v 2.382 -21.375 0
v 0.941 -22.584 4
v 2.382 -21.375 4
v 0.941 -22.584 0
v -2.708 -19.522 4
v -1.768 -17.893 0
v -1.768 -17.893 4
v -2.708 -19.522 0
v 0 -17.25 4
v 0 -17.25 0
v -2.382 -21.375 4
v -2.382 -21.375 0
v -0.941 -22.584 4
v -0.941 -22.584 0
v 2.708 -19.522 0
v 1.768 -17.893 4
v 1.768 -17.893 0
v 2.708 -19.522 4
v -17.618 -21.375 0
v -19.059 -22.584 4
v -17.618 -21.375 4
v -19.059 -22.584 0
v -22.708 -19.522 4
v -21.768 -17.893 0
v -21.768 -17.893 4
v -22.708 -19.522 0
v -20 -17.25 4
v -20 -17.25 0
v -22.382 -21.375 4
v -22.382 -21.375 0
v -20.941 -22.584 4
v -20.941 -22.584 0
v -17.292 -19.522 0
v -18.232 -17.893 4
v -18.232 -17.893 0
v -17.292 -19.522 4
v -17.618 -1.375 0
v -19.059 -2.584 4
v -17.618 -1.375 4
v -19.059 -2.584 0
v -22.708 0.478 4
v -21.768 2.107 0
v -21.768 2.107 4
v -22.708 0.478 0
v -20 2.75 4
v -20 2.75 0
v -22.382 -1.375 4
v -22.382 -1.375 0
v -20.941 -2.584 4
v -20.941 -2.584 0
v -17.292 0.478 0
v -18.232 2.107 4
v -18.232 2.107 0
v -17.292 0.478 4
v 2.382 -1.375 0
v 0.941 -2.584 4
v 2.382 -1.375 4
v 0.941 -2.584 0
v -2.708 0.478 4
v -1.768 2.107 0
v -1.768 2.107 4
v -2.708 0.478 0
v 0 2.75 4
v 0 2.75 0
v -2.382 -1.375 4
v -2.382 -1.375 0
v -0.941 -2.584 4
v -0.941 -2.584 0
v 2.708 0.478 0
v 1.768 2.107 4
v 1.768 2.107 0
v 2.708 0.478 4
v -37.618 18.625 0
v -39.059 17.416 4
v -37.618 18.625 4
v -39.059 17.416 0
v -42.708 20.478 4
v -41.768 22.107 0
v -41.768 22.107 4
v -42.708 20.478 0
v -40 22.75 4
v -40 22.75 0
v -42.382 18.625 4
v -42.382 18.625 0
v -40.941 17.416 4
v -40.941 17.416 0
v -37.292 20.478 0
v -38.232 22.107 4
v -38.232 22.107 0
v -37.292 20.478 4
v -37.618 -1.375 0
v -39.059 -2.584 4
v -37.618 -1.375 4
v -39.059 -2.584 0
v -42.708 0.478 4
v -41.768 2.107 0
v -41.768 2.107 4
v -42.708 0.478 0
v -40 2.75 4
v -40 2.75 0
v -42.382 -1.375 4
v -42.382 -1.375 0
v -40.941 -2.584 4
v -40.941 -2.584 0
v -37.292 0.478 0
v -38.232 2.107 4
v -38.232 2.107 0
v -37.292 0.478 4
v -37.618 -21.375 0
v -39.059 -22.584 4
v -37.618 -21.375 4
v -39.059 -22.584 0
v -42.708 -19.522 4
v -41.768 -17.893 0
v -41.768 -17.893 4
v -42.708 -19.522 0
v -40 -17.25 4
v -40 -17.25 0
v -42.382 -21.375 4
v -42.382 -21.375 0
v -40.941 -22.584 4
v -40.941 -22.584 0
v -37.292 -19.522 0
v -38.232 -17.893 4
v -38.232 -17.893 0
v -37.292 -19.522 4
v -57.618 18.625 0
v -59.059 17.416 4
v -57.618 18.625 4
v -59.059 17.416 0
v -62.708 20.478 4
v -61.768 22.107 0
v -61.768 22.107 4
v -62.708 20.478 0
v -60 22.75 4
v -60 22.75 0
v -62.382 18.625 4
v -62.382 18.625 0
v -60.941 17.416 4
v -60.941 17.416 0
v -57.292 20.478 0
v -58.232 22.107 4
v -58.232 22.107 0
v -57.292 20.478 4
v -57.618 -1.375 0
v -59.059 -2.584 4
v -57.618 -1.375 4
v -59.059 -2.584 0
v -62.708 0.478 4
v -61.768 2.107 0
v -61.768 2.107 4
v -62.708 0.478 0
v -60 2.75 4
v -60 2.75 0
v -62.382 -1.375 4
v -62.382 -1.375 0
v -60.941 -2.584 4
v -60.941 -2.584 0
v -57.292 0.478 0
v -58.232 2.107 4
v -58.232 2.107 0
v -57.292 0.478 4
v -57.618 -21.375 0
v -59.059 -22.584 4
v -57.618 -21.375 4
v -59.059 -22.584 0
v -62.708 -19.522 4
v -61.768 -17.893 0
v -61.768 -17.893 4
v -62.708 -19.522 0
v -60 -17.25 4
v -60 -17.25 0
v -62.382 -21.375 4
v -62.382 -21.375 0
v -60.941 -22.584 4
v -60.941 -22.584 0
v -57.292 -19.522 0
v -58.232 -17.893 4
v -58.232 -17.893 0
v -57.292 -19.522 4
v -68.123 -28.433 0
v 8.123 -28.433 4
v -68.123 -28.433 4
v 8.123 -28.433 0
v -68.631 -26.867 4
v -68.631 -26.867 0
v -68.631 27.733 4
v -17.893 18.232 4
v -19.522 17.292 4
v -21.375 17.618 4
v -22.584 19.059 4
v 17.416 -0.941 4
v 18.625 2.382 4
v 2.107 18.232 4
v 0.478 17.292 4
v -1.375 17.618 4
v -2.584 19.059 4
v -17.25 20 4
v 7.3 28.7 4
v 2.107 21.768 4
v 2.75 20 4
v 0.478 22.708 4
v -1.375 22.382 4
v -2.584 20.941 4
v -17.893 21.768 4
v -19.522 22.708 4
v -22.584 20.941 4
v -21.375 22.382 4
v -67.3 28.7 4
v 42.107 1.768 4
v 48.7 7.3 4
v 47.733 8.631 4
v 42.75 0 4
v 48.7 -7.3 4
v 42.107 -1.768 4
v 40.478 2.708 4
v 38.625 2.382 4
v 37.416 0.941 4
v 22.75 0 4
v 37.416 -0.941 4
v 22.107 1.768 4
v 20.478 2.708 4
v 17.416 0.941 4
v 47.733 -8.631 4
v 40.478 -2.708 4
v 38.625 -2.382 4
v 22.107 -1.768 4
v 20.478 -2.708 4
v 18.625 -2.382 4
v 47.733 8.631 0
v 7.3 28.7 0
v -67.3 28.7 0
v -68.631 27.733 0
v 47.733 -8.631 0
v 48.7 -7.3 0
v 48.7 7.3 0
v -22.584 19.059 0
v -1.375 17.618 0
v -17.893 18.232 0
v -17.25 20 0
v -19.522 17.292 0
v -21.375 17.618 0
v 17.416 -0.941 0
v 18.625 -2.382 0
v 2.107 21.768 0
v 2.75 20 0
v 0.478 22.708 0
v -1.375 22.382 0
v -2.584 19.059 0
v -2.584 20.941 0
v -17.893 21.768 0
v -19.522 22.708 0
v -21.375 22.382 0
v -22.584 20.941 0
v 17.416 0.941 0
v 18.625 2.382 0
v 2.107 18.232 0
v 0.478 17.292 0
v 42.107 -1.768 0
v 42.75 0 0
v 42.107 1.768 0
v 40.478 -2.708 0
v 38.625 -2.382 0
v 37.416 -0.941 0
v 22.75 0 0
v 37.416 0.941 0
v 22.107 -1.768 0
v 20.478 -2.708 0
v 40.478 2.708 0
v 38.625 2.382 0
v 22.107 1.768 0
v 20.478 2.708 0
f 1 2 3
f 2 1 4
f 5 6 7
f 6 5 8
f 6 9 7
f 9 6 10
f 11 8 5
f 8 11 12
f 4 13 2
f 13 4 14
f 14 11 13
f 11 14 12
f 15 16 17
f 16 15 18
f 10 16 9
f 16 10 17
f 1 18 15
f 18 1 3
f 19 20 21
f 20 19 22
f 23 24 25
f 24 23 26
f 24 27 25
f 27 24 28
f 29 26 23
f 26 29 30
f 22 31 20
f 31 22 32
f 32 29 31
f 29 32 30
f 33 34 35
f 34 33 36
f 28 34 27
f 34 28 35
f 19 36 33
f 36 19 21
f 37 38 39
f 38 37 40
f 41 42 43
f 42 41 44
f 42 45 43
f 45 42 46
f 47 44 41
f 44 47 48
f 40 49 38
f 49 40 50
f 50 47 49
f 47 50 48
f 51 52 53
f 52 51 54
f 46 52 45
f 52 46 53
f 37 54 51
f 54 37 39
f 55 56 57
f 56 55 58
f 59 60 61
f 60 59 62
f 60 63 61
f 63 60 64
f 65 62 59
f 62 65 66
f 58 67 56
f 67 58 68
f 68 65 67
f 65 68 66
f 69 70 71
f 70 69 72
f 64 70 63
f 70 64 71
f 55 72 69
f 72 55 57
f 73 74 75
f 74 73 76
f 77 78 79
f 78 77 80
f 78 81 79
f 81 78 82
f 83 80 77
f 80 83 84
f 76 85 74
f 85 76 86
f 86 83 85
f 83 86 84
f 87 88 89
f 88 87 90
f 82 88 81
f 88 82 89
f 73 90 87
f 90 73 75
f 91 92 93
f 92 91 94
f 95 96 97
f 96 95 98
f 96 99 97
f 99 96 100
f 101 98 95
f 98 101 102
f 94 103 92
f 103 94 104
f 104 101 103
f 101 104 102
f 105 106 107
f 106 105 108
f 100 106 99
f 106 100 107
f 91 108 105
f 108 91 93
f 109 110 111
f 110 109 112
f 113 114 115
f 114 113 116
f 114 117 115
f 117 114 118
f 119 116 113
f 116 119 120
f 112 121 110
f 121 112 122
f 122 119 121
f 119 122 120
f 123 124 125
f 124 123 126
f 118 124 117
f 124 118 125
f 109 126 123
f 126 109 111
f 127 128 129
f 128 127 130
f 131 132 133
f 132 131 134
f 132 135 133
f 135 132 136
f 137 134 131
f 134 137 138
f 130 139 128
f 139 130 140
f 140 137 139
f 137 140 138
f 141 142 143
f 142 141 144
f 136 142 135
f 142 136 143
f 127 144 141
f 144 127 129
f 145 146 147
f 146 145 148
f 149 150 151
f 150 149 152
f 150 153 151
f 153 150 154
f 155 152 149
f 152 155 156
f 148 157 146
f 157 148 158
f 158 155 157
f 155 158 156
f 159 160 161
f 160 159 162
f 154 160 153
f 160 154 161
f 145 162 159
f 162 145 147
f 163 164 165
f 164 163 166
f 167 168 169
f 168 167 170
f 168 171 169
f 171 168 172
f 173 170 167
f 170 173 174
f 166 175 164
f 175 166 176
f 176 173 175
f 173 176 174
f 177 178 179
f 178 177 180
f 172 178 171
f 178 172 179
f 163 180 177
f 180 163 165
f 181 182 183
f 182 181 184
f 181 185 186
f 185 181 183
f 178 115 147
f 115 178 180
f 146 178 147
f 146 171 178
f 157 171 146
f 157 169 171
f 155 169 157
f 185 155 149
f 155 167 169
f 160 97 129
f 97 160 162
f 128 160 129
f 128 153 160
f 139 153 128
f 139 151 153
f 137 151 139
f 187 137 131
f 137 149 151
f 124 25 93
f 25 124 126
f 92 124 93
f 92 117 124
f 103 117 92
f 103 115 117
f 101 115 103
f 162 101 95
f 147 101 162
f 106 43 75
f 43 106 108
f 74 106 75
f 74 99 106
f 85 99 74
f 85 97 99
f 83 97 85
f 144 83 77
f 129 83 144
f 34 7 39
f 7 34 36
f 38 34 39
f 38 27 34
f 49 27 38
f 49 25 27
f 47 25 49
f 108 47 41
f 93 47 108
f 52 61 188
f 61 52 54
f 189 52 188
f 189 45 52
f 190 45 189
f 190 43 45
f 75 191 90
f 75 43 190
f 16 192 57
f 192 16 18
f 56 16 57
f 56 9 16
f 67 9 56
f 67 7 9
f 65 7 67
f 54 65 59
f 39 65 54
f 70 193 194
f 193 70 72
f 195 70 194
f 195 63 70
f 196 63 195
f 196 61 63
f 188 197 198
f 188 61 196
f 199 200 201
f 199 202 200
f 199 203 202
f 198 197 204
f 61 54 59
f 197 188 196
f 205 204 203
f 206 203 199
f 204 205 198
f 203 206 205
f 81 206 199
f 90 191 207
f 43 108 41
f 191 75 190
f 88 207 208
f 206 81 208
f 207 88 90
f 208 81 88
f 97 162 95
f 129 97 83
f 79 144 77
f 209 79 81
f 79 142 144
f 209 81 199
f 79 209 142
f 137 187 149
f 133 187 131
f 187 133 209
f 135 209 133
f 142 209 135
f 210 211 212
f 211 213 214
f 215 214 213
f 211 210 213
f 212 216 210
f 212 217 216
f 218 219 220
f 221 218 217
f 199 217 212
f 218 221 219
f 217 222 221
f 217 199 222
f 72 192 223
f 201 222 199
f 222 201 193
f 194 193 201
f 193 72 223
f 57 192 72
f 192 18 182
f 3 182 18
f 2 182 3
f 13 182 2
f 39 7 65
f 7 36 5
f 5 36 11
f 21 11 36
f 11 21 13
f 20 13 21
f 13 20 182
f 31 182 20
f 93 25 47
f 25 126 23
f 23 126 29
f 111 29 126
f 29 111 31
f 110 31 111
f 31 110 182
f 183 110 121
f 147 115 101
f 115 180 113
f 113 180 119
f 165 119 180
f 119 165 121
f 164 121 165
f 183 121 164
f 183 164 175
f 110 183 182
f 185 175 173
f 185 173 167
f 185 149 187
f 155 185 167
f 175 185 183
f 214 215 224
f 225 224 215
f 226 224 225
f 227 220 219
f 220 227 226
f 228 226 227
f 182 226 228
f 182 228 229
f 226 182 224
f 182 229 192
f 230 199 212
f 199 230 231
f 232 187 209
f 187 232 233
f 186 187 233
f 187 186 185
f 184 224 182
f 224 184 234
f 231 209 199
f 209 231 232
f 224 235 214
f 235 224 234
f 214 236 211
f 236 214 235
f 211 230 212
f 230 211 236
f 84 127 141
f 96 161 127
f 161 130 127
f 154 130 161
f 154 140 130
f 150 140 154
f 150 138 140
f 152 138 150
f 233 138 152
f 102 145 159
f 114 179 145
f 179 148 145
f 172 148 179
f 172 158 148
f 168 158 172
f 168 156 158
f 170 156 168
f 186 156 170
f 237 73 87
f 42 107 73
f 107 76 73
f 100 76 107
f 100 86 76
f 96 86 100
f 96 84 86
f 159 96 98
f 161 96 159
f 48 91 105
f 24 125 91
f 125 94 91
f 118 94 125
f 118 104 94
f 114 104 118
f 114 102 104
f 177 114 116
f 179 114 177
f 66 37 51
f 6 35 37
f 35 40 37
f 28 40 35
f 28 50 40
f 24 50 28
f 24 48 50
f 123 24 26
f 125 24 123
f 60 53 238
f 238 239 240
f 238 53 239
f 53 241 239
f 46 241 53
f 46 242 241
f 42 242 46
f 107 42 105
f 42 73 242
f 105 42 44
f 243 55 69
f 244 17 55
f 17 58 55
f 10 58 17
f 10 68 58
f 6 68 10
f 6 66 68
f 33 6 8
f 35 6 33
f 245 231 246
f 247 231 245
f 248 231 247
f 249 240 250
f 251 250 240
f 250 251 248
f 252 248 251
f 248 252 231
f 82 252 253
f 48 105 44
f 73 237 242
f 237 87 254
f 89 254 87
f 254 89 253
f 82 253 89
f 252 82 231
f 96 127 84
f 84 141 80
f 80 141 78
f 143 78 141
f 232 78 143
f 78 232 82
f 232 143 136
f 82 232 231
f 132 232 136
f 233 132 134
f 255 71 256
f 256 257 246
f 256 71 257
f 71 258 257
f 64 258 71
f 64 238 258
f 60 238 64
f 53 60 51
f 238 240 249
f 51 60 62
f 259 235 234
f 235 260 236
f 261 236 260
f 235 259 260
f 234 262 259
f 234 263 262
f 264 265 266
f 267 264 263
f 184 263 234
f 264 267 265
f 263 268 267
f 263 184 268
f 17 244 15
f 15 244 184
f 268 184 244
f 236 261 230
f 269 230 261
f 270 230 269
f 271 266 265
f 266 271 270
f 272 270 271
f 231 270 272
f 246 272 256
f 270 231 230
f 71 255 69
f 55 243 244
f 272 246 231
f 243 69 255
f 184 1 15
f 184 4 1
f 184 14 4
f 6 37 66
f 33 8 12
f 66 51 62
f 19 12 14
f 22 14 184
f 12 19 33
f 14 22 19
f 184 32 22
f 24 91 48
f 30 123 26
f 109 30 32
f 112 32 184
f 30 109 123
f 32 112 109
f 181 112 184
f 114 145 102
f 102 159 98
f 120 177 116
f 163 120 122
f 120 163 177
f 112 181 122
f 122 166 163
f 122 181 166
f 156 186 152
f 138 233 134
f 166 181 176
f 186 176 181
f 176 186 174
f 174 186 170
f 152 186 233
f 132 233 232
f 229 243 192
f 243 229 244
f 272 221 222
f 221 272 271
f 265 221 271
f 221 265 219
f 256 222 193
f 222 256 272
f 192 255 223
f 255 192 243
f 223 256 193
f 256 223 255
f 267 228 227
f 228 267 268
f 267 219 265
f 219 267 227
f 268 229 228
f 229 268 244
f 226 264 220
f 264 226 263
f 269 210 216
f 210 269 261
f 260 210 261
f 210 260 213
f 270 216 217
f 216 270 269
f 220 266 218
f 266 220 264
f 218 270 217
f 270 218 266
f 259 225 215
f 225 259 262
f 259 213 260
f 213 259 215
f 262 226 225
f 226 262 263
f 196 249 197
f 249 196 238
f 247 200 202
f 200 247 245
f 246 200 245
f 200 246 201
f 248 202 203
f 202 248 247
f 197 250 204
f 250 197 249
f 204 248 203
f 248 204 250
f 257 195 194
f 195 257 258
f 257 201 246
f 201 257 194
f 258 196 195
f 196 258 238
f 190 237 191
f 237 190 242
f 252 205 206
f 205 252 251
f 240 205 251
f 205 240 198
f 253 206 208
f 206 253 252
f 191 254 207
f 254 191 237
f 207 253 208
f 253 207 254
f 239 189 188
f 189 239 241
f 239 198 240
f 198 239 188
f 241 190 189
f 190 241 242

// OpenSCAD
// rob@openpart.co.uk 20140202-02:02
// 14 hole joining plate to connect 80mm to 20mm NOMINAL extrusion
// V-Slot & others

module roundedRect(size, radius) {
	x = size[0];
	y = size[1];
	z = size[2];
	linear_extrude(height=z)
	hull()
	{
		// place 4 circles in the corners, with the given radius
		translate([(-x/2)+(radius/2), (-y/2)+(radius/2), 0])
		circle(r=radius);
		translate([(x/2)-(radius/2), (-y/2)+(radius/2), 0])
		circle(r=radius);
		translate([(-x/2)+(radius/2), (y/2)-(radius/2), 0])
		circle(r=radius);
		translate([(x/2)-(radius/2), (y/2)-(radius/2), 0])
		circle(r=radius);
	}
}
angle = 90;
hole = 5.5 / 2;
plate_width1 = 76;
plate_width2 = 16;
plate_length1 = 56;
plate_length2 = 16;
plate_thickness = 4;
extend_past_thickness = 2;
corner_radius = 1.4;
difference() {
	hull () {
		rotate([0,0,angle]) {
			translate([0, 30, 0])
				roundedRect ([plate_length1, plate_width1, plate_thickness], corner_radius);
		}
		translate([40, 0, 0])
				roundedRect ([plate_length2, plate_width2, plate_thickness], corner_radius);
		}

		translate([20,0,-1])
			cylinder(h = (extend_past_thickness+plate_thickness+2), r = hole);

		translate([40,0,-1])
			cylinder(h = (extend_past_thickness+plate_thickness+2), r = hole);

		translate([0,20,-1])
			cylinder(h = (extend_past_thickness+plate_thickness+2), r = hole);
		translate([-20,20,-1])
			cylinder(h = (extend_past_thickness+plate_thickness+2), r = hole);

		rotate([0,0,angle]) {
			translate([-20,0,-1])
				cylinder(h = (extend_past_thickness+plate_thickness+2), r = hole);
			translate([-20,20,-1])
				cylinder(h = (extend_past_thickness+plate_thickness+2), r = hole);
			translate([0,20,-1])
				cylinder(h = (extend_past_thickness+plate_thickness+2), r = hole);
			translate([0,0,-1])
				cylinder(h = (extend_past_thickness+plate_thickness+2), r = hole);

			translate([20,40,-1])
				cylinder(h = (extend_past_thickness+plate_thickness+2), r = hole);
			translate([0,40,-1])
				cylinder(h = (extend_past_thickness+plate_thickness+2), r = hole);
			translate([-20,40,-1])
				cylinder(h = (extend_past_thickness+plate_thickness+2), r = hole);


			translate([20,60,-1])
				cylinder(h = (extend_past_thickness+plate_thickness+2), r = hole);
			translate([0,60,-1])
				cylinder(h = (extend_past_thickness+plate_thickness+2), r = hole);
			translate([-20,60,-1])
				cylinder(h = (extend_past_thickness+plate_thickness+2), r = hole);

		}
}
